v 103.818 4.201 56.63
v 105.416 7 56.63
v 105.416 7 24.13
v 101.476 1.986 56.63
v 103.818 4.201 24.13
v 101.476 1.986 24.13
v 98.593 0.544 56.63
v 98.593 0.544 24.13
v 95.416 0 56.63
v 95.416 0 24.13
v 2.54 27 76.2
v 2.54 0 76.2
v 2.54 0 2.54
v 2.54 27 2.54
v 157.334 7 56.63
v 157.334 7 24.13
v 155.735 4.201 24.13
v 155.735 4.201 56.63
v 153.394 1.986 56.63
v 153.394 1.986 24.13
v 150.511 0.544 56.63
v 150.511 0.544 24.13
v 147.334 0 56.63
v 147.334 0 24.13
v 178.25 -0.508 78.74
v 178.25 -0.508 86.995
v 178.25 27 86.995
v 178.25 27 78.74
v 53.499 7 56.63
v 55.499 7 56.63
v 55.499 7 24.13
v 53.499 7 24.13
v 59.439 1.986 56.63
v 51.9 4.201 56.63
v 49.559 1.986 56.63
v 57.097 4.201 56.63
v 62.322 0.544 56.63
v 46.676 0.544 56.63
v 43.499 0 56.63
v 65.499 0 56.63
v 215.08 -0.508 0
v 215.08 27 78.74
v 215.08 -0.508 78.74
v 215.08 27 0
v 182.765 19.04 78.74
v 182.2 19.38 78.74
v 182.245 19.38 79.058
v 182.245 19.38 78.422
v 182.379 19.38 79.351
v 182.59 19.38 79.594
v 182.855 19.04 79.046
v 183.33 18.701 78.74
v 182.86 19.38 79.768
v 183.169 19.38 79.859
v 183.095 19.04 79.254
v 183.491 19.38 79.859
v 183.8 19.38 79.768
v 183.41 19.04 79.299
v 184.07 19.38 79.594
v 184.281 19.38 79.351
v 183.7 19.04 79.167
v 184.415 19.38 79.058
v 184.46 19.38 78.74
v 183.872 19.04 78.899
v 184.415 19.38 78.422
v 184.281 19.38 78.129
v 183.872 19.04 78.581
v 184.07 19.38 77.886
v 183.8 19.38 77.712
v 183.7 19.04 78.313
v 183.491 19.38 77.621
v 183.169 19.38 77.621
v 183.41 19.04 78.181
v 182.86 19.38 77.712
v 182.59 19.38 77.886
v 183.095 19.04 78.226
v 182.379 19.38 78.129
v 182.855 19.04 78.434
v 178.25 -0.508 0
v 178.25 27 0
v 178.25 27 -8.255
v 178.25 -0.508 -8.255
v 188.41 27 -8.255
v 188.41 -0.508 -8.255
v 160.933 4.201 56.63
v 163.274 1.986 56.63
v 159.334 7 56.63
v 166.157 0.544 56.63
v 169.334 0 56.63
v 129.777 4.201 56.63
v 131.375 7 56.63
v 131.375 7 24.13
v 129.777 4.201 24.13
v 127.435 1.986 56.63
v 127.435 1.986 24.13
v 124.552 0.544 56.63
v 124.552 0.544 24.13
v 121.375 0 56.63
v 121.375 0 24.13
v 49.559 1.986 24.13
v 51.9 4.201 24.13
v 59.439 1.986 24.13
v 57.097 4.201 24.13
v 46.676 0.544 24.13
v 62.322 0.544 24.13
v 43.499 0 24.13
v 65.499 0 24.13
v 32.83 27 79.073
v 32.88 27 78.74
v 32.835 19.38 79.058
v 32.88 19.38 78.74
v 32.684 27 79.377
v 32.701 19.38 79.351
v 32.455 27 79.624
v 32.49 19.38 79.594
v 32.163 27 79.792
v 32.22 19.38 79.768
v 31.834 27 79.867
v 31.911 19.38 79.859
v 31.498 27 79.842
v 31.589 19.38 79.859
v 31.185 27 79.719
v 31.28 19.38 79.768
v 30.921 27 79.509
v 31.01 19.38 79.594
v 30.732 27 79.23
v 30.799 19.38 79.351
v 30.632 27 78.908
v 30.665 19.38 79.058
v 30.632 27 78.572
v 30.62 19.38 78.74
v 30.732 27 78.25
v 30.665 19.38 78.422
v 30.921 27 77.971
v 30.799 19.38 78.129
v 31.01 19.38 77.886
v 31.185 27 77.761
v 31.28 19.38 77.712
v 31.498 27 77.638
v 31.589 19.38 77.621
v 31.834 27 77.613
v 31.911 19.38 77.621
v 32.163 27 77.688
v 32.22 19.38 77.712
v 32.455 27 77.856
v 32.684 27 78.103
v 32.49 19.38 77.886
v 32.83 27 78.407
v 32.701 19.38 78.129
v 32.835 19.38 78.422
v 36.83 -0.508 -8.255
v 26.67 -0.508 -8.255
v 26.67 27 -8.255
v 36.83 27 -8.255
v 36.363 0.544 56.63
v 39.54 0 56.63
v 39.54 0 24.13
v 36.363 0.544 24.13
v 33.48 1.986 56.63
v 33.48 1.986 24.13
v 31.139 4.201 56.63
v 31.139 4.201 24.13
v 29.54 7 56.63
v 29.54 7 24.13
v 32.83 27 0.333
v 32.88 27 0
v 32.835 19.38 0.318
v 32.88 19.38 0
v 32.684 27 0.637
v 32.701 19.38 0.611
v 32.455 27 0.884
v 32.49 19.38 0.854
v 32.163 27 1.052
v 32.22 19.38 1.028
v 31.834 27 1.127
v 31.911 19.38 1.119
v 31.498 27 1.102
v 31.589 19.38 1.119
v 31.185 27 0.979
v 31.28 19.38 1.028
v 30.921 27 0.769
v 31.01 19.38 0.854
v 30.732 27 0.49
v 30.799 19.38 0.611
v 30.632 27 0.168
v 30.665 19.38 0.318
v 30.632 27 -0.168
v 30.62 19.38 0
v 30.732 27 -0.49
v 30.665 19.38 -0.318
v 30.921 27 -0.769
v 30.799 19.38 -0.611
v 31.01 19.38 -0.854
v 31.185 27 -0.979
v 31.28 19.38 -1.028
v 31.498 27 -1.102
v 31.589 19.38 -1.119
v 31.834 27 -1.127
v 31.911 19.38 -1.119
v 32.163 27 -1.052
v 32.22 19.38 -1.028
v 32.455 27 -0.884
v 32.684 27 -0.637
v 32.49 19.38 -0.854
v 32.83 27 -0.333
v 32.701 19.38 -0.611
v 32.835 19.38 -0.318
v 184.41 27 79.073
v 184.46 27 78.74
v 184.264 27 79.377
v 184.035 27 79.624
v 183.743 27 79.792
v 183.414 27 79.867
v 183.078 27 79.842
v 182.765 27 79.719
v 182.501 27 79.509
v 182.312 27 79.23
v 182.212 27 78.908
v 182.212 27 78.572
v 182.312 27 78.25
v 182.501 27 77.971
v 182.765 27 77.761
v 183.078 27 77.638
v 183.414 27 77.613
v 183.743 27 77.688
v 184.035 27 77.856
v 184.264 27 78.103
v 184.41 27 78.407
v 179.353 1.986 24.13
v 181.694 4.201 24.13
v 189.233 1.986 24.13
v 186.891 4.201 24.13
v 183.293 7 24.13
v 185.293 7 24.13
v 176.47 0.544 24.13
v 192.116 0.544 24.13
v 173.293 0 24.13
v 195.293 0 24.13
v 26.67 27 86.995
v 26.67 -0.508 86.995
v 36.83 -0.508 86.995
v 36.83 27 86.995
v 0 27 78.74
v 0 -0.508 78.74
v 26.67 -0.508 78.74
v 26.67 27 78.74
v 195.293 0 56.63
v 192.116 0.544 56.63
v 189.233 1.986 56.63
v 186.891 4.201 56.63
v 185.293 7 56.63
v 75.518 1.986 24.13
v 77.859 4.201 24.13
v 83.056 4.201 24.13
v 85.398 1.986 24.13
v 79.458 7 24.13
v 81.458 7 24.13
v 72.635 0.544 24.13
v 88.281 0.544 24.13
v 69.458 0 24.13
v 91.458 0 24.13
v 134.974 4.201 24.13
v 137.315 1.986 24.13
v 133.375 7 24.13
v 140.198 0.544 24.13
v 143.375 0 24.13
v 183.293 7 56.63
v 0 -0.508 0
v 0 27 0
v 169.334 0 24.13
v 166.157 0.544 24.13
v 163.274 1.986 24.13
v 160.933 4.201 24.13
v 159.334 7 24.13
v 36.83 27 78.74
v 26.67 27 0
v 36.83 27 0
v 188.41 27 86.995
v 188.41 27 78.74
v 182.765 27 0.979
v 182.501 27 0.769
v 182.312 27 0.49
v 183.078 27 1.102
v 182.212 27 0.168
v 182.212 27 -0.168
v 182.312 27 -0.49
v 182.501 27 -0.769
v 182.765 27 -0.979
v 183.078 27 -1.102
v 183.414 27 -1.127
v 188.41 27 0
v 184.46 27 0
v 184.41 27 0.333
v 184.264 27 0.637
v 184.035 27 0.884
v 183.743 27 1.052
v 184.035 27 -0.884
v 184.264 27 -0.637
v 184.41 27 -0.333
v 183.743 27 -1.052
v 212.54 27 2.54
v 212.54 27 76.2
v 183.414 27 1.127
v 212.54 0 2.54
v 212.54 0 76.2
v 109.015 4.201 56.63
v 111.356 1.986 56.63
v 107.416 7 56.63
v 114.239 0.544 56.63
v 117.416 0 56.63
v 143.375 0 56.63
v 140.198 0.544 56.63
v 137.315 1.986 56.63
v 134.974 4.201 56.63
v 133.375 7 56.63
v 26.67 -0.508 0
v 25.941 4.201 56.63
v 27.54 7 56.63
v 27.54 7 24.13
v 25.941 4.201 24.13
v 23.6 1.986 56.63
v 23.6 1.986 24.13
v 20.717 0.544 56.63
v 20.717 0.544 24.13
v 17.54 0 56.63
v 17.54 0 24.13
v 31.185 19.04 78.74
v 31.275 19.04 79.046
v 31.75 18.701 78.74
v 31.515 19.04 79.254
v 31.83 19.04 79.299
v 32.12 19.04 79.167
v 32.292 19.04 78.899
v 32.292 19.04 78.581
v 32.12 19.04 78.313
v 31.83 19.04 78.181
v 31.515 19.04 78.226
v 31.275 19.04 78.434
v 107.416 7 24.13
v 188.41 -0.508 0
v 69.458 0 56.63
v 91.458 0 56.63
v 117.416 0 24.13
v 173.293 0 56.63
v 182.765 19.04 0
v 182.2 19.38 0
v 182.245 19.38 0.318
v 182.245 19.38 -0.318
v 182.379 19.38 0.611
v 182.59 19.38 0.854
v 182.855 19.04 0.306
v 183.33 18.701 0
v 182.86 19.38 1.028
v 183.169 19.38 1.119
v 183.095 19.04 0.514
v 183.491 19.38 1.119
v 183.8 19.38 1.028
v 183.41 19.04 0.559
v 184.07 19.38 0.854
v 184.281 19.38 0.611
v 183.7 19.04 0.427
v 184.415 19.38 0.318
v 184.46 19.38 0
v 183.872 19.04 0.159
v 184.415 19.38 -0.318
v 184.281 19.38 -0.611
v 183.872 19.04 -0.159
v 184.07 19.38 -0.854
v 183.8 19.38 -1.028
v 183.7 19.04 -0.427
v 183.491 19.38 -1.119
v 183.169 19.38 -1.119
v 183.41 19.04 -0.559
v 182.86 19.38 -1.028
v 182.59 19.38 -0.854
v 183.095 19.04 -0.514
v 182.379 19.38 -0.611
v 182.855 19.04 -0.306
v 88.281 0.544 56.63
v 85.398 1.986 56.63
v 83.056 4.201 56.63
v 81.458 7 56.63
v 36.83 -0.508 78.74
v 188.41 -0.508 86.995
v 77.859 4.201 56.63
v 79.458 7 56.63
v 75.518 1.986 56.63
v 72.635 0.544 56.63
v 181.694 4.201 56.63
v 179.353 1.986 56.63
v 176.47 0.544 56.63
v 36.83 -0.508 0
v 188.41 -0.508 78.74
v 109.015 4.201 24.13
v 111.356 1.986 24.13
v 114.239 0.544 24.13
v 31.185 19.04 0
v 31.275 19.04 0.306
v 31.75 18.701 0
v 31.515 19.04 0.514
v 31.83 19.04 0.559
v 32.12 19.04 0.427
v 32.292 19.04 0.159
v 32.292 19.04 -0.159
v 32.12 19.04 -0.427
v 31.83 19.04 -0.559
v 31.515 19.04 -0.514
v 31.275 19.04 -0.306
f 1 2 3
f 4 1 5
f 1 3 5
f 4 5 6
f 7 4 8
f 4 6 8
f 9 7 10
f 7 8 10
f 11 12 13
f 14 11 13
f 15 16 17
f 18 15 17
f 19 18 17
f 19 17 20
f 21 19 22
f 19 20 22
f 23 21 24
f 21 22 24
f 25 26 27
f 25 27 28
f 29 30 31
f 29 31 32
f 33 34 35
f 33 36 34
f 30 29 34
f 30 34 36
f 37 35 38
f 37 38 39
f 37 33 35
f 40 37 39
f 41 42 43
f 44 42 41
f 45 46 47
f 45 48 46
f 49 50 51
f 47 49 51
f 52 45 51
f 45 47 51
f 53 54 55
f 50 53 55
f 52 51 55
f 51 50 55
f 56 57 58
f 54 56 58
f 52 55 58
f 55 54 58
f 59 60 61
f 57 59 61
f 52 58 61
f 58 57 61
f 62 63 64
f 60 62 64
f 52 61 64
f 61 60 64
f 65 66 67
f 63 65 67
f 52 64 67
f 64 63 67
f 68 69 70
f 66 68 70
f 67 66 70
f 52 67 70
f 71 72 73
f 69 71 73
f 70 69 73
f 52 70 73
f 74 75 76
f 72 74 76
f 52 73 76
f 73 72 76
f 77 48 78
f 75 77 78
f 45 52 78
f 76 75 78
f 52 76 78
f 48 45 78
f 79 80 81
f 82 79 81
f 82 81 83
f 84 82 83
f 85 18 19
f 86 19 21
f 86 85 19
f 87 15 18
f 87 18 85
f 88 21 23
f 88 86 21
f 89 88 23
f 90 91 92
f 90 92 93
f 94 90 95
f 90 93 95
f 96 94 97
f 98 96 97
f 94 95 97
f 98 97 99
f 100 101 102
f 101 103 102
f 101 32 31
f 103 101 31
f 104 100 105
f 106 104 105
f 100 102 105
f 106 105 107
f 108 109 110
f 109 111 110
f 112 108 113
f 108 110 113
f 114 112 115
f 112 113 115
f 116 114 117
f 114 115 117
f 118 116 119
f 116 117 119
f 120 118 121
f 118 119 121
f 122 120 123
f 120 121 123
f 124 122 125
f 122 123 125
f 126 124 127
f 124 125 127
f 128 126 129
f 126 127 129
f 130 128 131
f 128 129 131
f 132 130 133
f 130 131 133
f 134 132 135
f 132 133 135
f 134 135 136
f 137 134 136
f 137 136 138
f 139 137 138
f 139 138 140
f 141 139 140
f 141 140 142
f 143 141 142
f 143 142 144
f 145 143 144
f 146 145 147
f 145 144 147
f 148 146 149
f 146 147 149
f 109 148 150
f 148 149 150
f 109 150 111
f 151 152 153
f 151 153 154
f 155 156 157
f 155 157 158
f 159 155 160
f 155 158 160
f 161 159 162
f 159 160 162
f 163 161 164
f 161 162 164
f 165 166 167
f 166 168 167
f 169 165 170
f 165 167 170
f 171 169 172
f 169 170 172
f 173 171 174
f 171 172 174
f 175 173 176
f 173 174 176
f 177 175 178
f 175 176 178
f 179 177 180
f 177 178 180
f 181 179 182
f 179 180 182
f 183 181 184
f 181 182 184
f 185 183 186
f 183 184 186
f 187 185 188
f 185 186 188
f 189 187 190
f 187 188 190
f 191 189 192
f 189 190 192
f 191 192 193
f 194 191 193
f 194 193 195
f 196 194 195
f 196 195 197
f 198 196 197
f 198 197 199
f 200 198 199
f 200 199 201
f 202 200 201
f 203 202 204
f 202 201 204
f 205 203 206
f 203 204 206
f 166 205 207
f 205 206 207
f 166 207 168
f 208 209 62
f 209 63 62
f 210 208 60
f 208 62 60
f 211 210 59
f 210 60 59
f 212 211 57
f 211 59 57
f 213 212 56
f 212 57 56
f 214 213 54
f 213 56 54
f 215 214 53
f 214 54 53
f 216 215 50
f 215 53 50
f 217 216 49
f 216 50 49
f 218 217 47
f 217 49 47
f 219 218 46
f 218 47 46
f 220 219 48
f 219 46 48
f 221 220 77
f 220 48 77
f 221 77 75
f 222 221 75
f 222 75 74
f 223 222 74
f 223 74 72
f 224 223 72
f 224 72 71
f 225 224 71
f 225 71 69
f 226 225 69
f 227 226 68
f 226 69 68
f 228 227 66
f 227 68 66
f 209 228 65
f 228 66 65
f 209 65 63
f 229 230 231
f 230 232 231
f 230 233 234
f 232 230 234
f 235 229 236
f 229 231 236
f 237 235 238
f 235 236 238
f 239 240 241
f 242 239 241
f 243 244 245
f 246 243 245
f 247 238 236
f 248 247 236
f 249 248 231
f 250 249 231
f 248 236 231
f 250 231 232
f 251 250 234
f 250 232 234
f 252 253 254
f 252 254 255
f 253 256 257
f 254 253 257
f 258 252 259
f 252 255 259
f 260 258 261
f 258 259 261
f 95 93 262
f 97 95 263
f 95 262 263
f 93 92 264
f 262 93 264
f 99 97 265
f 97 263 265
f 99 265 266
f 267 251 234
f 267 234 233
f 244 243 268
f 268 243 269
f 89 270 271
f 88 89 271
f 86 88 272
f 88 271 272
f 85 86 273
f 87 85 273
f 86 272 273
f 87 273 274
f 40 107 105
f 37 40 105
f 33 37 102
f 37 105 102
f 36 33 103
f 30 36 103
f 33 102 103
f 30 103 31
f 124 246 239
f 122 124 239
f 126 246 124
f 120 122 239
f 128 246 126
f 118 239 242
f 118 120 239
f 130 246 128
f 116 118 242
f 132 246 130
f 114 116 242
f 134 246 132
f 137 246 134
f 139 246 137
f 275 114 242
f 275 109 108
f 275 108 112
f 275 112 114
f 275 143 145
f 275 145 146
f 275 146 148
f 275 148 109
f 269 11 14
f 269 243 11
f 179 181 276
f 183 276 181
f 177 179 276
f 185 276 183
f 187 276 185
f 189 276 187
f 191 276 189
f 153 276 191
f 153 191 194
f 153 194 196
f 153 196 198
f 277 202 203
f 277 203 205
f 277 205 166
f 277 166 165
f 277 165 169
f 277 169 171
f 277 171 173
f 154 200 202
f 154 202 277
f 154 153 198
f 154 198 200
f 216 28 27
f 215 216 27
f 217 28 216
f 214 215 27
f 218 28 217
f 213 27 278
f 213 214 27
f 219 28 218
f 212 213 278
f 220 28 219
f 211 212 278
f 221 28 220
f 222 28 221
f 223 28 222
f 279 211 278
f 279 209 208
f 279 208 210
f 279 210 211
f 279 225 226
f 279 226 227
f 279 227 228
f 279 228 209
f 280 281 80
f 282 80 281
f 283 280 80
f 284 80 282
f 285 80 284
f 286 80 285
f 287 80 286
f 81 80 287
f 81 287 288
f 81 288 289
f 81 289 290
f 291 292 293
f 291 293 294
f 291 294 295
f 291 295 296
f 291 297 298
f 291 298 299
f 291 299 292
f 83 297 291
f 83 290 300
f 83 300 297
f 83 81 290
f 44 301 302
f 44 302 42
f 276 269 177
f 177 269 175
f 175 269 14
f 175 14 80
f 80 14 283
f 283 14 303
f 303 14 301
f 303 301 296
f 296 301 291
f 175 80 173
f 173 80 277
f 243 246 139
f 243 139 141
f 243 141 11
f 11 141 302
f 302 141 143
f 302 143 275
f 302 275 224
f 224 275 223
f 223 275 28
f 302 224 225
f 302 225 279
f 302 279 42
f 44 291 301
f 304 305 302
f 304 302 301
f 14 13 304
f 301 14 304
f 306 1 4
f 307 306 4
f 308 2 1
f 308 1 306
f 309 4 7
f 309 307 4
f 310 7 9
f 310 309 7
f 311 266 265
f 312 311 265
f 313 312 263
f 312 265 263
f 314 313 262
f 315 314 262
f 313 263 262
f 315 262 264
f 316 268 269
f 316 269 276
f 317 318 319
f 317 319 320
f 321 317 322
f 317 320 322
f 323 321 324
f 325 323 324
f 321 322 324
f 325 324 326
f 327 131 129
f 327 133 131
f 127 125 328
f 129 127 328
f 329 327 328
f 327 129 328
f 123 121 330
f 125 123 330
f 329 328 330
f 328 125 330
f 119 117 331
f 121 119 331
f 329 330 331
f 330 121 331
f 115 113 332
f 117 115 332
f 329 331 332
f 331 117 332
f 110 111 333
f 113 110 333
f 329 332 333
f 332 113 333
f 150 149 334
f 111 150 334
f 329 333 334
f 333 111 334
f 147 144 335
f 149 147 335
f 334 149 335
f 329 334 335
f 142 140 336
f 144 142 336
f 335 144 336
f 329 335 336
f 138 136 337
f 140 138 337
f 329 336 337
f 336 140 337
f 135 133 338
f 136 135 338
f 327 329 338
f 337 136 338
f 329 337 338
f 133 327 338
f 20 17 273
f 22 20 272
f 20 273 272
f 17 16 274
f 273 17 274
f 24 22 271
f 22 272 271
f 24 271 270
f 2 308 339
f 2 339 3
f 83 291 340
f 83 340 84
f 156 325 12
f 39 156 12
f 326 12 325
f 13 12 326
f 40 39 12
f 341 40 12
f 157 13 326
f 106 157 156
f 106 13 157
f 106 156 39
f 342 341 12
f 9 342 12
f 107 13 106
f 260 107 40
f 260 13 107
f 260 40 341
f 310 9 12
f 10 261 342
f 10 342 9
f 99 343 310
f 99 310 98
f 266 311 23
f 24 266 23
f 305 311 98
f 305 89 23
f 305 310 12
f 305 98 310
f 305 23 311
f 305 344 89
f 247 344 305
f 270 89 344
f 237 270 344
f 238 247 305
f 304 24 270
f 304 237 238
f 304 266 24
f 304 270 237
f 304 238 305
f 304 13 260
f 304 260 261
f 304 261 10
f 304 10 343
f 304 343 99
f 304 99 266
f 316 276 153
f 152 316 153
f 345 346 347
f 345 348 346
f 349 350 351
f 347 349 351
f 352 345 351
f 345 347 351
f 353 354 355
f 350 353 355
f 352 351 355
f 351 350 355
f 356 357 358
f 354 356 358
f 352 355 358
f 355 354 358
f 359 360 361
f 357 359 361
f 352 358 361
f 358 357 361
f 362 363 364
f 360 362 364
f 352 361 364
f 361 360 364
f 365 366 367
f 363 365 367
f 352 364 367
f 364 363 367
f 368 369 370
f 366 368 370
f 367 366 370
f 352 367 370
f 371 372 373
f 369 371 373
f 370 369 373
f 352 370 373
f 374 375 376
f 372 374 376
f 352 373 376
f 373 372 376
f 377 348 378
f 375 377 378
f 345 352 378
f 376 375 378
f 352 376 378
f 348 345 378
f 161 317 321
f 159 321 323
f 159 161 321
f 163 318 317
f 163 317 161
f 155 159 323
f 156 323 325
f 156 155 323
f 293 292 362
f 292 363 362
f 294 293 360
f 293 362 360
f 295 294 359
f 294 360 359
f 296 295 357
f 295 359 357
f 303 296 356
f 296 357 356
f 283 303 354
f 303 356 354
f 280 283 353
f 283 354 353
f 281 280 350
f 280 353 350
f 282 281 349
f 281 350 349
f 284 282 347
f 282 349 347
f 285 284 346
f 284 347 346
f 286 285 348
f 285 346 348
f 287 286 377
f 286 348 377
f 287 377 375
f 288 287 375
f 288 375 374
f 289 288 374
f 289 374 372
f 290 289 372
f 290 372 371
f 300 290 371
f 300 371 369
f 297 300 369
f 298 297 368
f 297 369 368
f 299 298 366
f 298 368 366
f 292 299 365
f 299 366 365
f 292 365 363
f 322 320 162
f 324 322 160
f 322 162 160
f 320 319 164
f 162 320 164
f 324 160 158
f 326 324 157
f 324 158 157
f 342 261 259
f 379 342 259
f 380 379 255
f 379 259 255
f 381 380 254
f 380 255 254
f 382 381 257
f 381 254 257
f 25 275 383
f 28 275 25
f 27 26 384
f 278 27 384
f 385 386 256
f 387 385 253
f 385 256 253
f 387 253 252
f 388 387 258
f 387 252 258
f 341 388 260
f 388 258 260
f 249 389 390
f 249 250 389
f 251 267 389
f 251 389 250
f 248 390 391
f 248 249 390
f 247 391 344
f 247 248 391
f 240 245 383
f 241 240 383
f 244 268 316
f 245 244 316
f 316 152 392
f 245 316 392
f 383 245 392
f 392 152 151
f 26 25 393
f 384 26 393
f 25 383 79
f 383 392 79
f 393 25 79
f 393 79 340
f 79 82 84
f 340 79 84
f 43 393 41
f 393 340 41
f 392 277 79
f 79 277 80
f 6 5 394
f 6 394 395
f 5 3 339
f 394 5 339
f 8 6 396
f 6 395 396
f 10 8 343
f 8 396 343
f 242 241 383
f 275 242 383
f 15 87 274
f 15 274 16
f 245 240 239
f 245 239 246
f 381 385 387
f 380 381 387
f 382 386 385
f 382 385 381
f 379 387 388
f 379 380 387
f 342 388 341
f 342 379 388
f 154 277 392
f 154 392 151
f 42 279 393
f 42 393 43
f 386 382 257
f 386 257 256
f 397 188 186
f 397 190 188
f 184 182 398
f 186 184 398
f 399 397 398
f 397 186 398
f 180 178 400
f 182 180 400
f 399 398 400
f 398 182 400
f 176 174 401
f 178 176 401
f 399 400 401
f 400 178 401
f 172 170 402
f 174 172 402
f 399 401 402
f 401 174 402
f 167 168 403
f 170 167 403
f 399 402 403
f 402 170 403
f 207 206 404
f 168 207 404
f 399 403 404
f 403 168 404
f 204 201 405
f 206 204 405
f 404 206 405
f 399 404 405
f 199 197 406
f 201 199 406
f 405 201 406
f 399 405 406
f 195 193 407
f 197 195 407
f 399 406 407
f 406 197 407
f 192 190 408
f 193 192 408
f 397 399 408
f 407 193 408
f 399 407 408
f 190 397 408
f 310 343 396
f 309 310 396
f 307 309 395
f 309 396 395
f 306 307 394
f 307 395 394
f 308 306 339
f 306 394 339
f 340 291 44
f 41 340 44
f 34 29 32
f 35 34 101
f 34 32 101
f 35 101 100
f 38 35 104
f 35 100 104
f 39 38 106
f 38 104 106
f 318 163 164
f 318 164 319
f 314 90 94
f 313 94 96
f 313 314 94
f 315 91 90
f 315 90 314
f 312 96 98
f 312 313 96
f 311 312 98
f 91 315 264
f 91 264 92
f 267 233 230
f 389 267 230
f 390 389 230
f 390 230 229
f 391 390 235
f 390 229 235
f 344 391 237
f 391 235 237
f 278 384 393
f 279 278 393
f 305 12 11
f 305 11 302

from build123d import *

# Parameters (mm, degrees)
SKETCH1_W                 = 215.08
SKETCH1_H                 = 78.74
BOSS_EXTRUDE1_DEPTH       = 0.508
SKETCH1_3_W               = 215.08
SKETCH1_3_H               = 8.255
SKETCH1_3_H_2             = 78.74
SKETCH1_3_W_2             = 210
SKETCH1_3_H_3             = 73.66
BOSS_EXTRUDE2_DEPTH       = 27
BOSS_EXTRUDE3_START       = 21.59
BOSS_EXTRUDE3_DEPTH       = 32.5
SKETCH1_4_W               = 215.08
SKETCH1_4_H               = 8.255
BOSS_EXTRUDE4_DEPTH       = 0.508
F_4_40_TAPPED_HOLE2_D     = 2.2606
F_4_40_TAPPED_HOLE2_DEPTH = 7.62
F_4_40_TAPPED_HOLE2_TIP   = 0.679152758
SKETCH13_W                = 141.42
SKETCH13_H                = 8.255
SKETCH13_W_2              = 26.67
CUT_EXTRUDE1_DEPTH        = 28.508


with BuildPart() as part:
    # Sketch1 → Boss-Extrude1 (new body)
    with BuildSketch(Plane(origin=(0, 0, 0), x_dir=(1, 0, 0), z_dir=(0, 1, 0))):
        with Locations((107.54, -39.37)):
            Rectangle(SKETCH1_W, SKETCH1_H)
    extrude(amount=-BOSS_EXTRUDE1_DEPTH)

    # Sketch1<3> → Boss-Extrude2 (add)
    with BuildSketch(Plane(origin=(0, 0, 0), x_dir=(1, 0, 0), z_dir=(0, 1, 0))):
        with Locations((107.54, 4.1275)):
            Rectangle(SKETCH1_3_W, SKETCH1_3_H)
        with Locations((107.54, -82.8675)):
            Rectangle(SKETCH1_3_W, SKETCH1_3_H)
        with Locations((107.54, -39.37)):
            Rectangle(SKETCH1_3_W, SKETCH1_3_H_2)
        with Locations((107.54, -39.37)):
            Rectangle(SKETCH1_3_W_2, SKETCH1_3_H_3, mode=Mode.SUBTRACT)
    extrude(amount=BOSS_EXTRUDE2_DEPTH)

    # Sketch5 → Boss-Extrude3 (add)
    with BuildSketch(Plane.XY.offset(2.54).offset(BOSS_EXTRUDE3_START)):
        with BuildLine():
            Line((29.54, 7), (27.54, 7))
            ThreePointArc((27.54, 7), (23.600043647, 1.985651932), (17.54, 0))
            Line((17.54, 0), (39.54, 0))
            ThreePointArc((39.54, 0), (33.479956353, 1.985651932), (29.54, 7))
        make_face()
        with BuildLine():
            Line((55.4988, 7), (53.4988, 7))
            ThreePointArc((53.4988, 7), (49.558843647, 1.985651932), (43.4988, 0))
            Line((43.4988, 0), (65.4988, 0))
            ThreePointArc((65.4988, 0), (59.438756353, 1.985651932), (55.4988, 7))
        make_face()
        with BuildLine():
            Line((81.4576, 7), (79.4576, 7))
            ThreePointArc((79.4576, 7), (75.517643647, 1.985651932), (69.4576, 0))
            Line((69.4576, 0), (91.4576, 0))
            ThreePointArc((91.4576, 0), (85.397556353, 1.985651932), (81.4576, 7))
        make_face()
        with BuildLine():
            Line((107.4164, 7), (105.4164, 7))
            ThreePointArc((105.4164, 7), (101.476443647, 1.985651932), (95.4164, 0))
            Line((95.4164, 0), (117.4164, 0))
            ThreePointArc((117.4164, 0), (111.356356353, 1.985651932), (107.4164, 7))
        make_face()
        with BuildLine():
            Line((133.3752, 7), (131.3752, 7))
            ThreePointArc((131.3752, 7), (127.435243647, 1.985651932), (121.3752, 0))
            Line((121.3752, 0), (143.3752, 0))
            ThreePointArc((143.3752, 0), (137.315156353, 1.985651932), (133.3752, 7))
        make_face()
        with BuildLine():
            Line((159.334, 7), (157.334, 7))
            ThreePointArc((157.334, 7), (153.394043647, 1.985651932), (147.334, 0))
            Line((147.334, 0), (169.334, 0))
            ThreePointArc((169.334, 0), (163.273956353, 1.985651932), (159.334, 7))
        make_face()
        with BuildLine():
            Line((185.2928, 7), (183.2928, 7))
            ThreePointArc((183.2928, 7), (179.352843647, 1.985651932), (173.2928, 0))
            Line((173.2928, 0), (195.2928, 0))
            ThreePointArc((195.2928, 0), (189.232756353, 1.985651932), (185.2928, 7))
        make_face()
    extrude(amount=BOSS_EXTRUDE3_DEPTH)

    # Sketch1<4> → Boss-Extrude4 (add)
    with BuildSketch(Plane(origin=(0, 0, 0), x_dir=(1, 0, 0), z_dir=(0, 1, 0))):
        with Locations((107.54, 4.1275)):
            Rectangle(SKETCH1_4_W, SKETCH1_4_H)
        with Locations((107.54, -82.8675)):
            Rectangle(SKETCH1_4_W, SKETCH1_4_H)
    extrude(amount=-BOSS_EXTRUDE4_DEPTH)

    # #4-40 Tapped Hole2
    with Locations(Plane(origin=(0, 27, 0), x_dir=(-1, 0, 0), z_dir=(0, 1, 0))):
        with Locations((-31.75, 0), (-183.33, 0), (-31.75, 78.74), (-183.33, 78.74)):
            Hole(F_4_40_TAPPED_HOLE2_D / 2, depth=F_4_40_TAPPED_HOLE2_DEPTH)
            with Locations((0, 0, -(F_4_40_TAPPED_HOLE2_DEPTH + F_4_40_TAPPED_HOLE2_TIP / 2))):  # 118° drill point
                Cone(0, F_4_40_TAPPED_HOLE2_D / 2, F_4_40_TAPPED_HOLE2_TIP, mode=Mode.SUBTRACT)

    # Sketch13 → Cut-Extrude1 (cut, through all)
    with BuildSketch(Plane(origin=(0, 27, 0), x_dir=(1, 0, 0), z_dir=(0, 1, 0))):
        with Locations((107.54, 4.1275)):
            Rectangle(SKETCH13_W, SKETCH13_H)
        with Locations((107.54, -82.8675)):
            Rectangle(SKETCH13_W, SKETCH13_H)
        with Locations((13.335, 4.1275)):
            Rectangle(SKETCH13_W_2, SKETCH13_H)
        with Locations((201.745, 4.1275)):
            Rectangle(SKETCH13_W_2, SKETCH13_H)
        with Locations((201.745, -82.8675)):
            Rectangle(SKETCH13_W_2, SKETCH13_H)
        with Locations((13.335, -82.8675)):
            Rectangle(SKETCH13_W_2, SKETCH13_H)
    extrude(amount=-CUT_EXTRUDE1_DEPTH, mode=Mode.SUBTRACT)


solid = part.part
